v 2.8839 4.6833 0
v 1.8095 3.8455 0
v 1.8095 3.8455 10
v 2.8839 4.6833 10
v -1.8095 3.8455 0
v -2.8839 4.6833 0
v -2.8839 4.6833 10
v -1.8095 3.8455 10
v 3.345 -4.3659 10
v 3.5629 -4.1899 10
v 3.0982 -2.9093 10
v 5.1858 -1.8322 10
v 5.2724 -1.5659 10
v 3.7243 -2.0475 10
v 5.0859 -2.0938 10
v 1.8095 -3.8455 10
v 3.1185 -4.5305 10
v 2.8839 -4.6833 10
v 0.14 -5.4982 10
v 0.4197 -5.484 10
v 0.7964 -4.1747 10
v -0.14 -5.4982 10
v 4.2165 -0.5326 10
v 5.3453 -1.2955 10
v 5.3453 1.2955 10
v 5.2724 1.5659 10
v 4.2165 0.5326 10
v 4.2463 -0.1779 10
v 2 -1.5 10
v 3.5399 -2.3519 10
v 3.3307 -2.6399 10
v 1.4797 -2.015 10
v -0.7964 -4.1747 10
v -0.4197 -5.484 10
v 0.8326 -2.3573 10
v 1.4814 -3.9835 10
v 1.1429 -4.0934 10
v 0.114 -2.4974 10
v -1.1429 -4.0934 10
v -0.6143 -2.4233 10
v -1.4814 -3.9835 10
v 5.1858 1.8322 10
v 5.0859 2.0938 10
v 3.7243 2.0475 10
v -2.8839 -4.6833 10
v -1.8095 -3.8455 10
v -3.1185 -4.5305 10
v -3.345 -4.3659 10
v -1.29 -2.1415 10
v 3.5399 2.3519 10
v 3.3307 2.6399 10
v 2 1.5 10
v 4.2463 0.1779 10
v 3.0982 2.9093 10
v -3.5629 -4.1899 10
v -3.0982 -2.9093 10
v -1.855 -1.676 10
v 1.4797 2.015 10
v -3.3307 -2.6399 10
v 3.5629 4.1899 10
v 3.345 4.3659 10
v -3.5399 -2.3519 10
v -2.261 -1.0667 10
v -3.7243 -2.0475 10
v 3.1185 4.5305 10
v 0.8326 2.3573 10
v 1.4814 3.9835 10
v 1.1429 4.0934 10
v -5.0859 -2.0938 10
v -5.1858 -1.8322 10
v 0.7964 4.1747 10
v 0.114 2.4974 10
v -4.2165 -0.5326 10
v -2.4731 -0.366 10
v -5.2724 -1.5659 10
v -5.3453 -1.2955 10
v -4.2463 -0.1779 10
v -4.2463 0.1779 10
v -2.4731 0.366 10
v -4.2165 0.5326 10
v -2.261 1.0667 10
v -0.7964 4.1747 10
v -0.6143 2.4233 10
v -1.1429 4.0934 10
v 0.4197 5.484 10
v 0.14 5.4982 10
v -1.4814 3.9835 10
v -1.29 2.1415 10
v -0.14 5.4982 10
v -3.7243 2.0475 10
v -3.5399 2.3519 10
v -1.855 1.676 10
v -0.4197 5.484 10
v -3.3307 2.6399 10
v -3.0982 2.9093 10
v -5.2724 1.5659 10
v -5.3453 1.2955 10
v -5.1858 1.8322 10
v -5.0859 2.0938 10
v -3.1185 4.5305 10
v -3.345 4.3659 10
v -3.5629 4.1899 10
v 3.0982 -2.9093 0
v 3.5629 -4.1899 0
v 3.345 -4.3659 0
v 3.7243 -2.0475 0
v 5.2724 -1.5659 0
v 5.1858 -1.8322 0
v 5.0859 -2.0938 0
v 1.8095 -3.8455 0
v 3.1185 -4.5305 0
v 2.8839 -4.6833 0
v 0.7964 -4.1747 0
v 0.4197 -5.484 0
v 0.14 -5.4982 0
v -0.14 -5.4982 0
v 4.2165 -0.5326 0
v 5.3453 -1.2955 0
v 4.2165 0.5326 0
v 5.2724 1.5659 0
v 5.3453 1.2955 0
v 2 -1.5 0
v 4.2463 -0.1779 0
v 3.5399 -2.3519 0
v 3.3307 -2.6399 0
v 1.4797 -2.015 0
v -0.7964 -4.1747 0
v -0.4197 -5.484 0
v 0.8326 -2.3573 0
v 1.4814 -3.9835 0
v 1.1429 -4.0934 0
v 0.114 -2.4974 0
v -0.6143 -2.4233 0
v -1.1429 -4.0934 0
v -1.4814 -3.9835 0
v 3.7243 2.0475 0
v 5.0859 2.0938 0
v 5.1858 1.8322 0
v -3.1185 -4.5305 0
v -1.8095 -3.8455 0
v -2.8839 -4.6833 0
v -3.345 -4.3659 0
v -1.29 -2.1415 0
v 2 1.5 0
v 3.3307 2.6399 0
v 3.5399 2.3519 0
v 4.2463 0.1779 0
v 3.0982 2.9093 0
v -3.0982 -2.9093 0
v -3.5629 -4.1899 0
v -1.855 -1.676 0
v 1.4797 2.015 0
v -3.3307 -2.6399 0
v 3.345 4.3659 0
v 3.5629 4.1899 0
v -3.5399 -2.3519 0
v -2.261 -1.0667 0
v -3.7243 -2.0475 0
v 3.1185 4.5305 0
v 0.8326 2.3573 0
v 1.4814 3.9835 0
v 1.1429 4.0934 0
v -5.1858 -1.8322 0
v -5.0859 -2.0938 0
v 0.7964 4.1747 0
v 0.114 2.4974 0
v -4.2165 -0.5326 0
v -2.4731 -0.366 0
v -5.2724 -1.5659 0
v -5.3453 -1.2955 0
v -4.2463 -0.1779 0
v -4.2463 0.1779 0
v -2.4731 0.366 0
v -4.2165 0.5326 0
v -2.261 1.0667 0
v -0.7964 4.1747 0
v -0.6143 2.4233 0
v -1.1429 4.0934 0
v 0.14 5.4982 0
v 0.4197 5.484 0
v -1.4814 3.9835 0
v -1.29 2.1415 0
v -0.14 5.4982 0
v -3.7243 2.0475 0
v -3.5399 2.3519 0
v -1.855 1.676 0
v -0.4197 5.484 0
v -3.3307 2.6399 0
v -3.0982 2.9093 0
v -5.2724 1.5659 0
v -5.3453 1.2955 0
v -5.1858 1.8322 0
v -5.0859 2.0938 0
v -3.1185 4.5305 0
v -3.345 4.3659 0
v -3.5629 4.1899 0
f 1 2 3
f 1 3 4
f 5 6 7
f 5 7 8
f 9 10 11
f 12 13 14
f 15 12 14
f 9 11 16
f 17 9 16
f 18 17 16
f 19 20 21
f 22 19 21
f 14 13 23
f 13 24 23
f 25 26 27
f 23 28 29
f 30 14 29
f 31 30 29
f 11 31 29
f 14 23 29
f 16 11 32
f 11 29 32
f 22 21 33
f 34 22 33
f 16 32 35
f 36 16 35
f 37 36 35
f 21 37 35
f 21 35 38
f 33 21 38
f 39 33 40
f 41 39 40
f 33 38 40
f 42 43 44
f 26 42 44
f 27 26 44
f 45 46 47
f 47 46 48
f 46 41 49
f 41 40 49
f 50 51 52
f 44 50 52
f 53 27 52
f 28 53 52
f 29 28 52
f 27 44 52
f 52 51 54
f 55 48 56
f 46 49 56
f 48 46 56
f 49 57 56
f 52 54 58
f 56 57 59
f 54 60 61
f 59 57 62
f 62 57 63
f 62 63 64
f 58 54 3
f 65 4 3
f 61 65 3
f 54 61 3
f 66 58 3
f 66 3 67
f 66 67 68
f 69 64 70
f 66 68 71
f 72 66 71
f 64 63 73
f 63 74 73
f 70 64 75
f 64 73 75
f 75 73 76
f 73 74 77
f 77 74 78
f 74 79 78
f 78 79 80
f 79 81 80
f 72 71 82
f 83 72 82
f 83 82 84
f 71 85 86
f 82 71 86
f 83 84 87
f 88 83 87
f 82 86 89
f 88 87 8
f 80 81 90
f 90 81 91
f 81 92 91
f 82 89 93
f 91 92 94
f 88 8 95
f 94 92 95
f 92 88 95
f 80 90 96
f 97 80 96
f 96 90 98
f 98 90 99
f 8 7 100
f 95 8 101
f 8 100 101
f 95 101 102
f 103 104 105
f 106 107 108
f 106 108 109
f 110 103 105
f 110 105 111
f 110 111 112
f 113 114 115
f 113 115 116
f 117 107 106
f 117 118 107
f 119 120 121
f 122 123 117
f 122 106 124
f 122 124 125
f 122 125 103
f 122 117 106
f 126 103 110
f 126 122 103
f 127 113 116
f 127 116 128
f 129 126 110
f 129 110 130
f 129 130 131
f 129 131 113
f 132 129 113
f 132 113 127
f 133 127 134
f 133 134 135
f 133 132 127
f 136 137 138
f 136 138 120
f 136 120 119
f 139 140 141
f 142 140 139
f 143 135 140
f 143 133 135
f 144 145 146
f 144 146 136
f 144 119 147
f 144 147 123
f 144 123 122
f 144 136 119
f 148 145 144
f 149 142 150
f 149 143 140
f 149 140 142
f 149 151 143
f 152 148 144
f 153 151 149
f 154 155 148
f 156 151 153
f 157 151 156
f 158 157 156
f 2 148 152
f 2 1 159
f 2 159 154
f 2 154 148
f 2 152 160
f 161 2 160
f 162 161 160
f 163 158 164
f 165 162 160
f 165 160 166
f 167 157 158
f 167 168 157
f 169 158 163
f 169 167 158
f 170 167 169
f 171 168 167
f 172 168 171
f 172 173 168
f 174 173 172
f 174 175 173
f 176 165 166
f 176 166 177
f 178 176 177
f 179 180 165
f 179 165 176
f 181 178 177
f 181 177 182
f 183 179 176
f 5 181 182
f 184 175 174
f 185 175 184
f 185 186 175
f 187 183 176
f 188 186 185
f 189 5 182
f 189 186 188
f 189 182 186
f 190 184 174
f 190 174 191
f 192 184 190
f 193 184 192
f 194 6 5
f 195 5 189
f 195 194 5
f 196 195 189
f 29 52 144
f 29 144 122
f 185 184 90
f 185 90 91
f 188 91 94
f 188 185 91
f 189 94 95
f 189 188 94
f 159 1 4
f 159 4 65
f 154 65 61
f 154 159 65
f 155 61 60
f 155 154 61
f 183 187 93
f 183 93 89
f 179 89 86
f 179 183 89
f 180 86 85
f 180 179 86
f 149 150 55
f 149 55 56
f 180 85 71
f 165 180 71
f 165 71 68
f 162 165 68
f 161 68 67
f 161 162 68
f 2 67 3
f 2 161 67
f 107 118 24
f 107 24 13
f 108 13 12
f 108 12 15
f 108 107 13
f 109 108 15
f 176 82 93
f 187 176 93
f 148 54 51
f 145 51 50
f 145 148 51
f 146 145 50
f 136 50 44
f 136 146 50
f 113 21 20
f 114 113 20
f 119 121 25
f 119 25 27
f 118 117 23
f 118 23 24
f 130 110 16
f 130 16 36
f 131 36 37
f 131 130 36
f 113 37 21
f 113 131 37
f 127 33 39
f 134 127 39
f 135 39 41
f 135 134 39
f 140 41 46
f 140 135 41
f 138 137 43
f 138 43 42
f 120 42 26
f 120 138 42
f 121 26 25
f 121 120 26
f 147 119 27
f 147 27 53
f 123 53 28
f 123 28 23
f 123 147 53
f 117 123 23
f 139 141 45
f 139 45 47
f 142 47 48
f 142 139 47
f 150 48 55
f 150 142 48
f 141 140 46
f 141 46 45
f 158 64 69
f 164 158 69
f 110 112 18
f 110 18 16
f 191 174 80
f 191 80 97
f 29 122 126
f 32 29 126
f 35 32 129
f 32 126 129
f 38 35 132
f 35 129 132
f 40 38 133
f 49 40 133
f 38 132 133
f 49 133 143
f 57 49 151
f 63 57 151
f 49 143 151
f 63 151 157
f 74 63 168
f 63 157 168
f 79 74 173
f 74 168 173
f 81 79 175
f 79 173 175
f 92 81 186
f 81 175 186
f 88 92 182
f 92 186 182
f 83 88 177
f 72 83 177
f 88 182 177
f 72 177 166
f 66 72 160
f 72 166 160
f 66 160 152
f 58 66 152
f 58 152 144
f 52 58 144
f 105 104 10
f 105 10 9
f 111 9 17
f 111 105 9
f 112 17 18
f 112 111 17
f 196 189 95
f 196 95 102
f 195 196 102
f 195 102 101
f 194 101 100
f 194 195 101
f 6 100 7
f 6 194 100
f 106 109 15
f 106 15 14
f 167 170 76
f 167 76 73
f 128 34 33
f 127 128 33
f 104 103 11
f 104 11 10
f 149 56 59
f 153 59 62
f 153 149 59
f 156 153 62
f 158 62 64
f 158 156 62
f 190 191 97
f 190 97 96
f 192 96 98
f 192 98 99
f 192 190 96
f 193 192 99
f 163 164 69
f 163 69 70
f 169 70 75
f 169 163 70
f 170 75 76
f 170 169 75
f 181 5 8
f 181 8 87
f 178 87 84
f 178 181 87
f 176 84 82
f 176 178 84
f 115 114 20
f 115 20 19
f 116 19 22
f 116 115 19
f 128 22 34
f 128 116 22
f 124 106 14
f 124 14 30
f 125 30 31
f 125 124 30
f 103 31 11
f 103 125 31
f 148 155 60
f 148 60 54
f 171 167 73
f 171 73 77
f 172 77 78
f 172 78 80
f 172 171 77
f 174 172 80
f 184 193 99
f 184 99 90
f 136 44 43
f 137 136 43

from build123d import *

# Parameters (mm, degrees)
BOSS_EXTRUDE1_DEPTH = 10


with BuildPart() as part:
    # Sketch1 → Boss-Extrude1 (new body)
    with BuildSketch(Plane.XY):
        with BuildLine():
            Line((-0.796448866, 4.174705882), (-0.41969374, 5.483963636))
            ThreePointArc((-0.41969374, 5.483963636), (0, 5.5), (0.41969374, 5.483963636))
            Line((0.41969374, 5.483963636), (0.796448866, 4.174705882))
            ThreePointArc((0.796448866, 4.174705882), (1.313322226, 4.041990194), (1.809489883, 3.845548903))
            Line((1.809489883, 3.845548903), (2.883853582, 4.683309569))
            ThreePointArc((2.883853582, 4.683309569), (3.232818888, 4.449593469), (3.562932317, 4.189929988))
            Line((3.562932317, 4.189929988), (3.098171218, 2.909267108))
            ThreePointArc((3.098171218, 2.909267108), (3.438322226, 2.498087322), (3.724264998, 2.047522948))
            Line((3.724264998, 2.047522948), (5.085866854, 2.093790426))
            ThreePointArc((5.085866854, 2.093790426), (5.23081084, 1.699593469), (5.345251849, 1.295485494))
            Line((5.345251849, 1.295485494), (4.216497468, 0.53258718))
            ThreePointArc((4.216497468, 0.53258718), (4.25, 0), (4.216497468, -0.53258718))
            Line((4.216497468, -0.53258718), (5.345251849, -1.295485494))
            ThreePointArc((5.345251849, -1.295485494), (5.23081084, -1.699593469), (5.085866854, -2.093790426))
            Line((5.085866854, -2.093790426), (3.724264998, -2.047522948))
            ThreePointArc((3.724264998, -2.047522948), (3.438322226, -2.498087322), (3.098171218, -2.909267108))
            Line((3.098171218, -2.909267108), (3.562932317, -4.189929988))
            ThreePointArc((3.562932317, -4.189929988), (3.232818888, -4.449593469), (2.883853582, -4.683309569))
            Line((2.883853582, -4.683309569), (1.809489883, -3.845548903))
            ThreePointArc((1.809489883, -3.845548903), (1.313322226, -4.041990194), (0.796448866, -4.174705882))
            Line((0.796448866, -4.174705882), (0.41969374, -5.483963636))
            ThreePointArc((0.41969374, -5.483963636), (0, -5.5), (-0.41969374, -5.483963636))
            Line((-0.41969374, -5.483963636), (-0.796448866, -4.174705882))
            ThreePointArc((-0.796448866, -4.174705882), (-1.313322226, -4.041990194), (-1.809489883, -3.845548903))
            Line((-1.809489883, -3.845548903), (-2.883853582, -4.683309569))
            ThreePointArc((-2.883853582, -4.683309569), (-3.232818888, -4.449593469), (-3.562932317, -4.189929988))
            Line((-3.562932317, -4.189929988), (-3.098171218, -2.909267108))
            ThreePointArc((-3.098171218, -2.909267108), (-3.438322226, -2.498087322), (-3.724264998, -2.047522948))
            Line((-3.724264998, -2.047522948), (-5.085866854, -2.093790426))
            ThreePointArc((-5.085866854, -2.093790426), (-5.23081084, -1.699593469), (-5.345251849, -1.295485494))
            Line((-5.345251849, -1.295485494), (-4.216497468, -0.53258718))
            ThreePointArc((-4.216497468, -0.53258718), (-4.25, 0), (-4.216497468, 0.53258718))
            Line((-4.216497468, 0.53258718), (-5.345251849, 1.295485494))
            ThreePointArc((-5.345251849, 1.295485494), (-5.23081084, 1.699593469), (-5.085866854, 2.093790426))
            Line((-5.085866854, 2.093790426), (-3.724264998, 2.047522948))
            ThreePointArc((-3.724264998, 2.047522948), (-3.438322226, 2.498087322), (-3.098171218, 2.909267108))
            Line((-3.098171218, 2.909267108), (-3.562932317, 4.189929988))
            ThreePointArc((-3.562932317, 4.189929988), (-3.232818888, 4.449593469), (-2.883853582, 4.683309569))
            Line((-2.883853582, 4.683309569), (-1.809489883, 3.845548903))
            ThreePointArc((-1.809489883, 3.845548903), (-1.313322226, 4.041990194), (-0.796448866, 4.174705882))
        make_face()
        with BuildLine():
            Line((2, 1.5), (2, -1.5))
            ThreePointArc((2, -1.5), (-2.5, 0), (2, 1.5))
        make_face(mode=Mode.SUBTRACT)
    extrude(amount=BOSS_EXTRUDE1_DEPTH)


solid = part.part
